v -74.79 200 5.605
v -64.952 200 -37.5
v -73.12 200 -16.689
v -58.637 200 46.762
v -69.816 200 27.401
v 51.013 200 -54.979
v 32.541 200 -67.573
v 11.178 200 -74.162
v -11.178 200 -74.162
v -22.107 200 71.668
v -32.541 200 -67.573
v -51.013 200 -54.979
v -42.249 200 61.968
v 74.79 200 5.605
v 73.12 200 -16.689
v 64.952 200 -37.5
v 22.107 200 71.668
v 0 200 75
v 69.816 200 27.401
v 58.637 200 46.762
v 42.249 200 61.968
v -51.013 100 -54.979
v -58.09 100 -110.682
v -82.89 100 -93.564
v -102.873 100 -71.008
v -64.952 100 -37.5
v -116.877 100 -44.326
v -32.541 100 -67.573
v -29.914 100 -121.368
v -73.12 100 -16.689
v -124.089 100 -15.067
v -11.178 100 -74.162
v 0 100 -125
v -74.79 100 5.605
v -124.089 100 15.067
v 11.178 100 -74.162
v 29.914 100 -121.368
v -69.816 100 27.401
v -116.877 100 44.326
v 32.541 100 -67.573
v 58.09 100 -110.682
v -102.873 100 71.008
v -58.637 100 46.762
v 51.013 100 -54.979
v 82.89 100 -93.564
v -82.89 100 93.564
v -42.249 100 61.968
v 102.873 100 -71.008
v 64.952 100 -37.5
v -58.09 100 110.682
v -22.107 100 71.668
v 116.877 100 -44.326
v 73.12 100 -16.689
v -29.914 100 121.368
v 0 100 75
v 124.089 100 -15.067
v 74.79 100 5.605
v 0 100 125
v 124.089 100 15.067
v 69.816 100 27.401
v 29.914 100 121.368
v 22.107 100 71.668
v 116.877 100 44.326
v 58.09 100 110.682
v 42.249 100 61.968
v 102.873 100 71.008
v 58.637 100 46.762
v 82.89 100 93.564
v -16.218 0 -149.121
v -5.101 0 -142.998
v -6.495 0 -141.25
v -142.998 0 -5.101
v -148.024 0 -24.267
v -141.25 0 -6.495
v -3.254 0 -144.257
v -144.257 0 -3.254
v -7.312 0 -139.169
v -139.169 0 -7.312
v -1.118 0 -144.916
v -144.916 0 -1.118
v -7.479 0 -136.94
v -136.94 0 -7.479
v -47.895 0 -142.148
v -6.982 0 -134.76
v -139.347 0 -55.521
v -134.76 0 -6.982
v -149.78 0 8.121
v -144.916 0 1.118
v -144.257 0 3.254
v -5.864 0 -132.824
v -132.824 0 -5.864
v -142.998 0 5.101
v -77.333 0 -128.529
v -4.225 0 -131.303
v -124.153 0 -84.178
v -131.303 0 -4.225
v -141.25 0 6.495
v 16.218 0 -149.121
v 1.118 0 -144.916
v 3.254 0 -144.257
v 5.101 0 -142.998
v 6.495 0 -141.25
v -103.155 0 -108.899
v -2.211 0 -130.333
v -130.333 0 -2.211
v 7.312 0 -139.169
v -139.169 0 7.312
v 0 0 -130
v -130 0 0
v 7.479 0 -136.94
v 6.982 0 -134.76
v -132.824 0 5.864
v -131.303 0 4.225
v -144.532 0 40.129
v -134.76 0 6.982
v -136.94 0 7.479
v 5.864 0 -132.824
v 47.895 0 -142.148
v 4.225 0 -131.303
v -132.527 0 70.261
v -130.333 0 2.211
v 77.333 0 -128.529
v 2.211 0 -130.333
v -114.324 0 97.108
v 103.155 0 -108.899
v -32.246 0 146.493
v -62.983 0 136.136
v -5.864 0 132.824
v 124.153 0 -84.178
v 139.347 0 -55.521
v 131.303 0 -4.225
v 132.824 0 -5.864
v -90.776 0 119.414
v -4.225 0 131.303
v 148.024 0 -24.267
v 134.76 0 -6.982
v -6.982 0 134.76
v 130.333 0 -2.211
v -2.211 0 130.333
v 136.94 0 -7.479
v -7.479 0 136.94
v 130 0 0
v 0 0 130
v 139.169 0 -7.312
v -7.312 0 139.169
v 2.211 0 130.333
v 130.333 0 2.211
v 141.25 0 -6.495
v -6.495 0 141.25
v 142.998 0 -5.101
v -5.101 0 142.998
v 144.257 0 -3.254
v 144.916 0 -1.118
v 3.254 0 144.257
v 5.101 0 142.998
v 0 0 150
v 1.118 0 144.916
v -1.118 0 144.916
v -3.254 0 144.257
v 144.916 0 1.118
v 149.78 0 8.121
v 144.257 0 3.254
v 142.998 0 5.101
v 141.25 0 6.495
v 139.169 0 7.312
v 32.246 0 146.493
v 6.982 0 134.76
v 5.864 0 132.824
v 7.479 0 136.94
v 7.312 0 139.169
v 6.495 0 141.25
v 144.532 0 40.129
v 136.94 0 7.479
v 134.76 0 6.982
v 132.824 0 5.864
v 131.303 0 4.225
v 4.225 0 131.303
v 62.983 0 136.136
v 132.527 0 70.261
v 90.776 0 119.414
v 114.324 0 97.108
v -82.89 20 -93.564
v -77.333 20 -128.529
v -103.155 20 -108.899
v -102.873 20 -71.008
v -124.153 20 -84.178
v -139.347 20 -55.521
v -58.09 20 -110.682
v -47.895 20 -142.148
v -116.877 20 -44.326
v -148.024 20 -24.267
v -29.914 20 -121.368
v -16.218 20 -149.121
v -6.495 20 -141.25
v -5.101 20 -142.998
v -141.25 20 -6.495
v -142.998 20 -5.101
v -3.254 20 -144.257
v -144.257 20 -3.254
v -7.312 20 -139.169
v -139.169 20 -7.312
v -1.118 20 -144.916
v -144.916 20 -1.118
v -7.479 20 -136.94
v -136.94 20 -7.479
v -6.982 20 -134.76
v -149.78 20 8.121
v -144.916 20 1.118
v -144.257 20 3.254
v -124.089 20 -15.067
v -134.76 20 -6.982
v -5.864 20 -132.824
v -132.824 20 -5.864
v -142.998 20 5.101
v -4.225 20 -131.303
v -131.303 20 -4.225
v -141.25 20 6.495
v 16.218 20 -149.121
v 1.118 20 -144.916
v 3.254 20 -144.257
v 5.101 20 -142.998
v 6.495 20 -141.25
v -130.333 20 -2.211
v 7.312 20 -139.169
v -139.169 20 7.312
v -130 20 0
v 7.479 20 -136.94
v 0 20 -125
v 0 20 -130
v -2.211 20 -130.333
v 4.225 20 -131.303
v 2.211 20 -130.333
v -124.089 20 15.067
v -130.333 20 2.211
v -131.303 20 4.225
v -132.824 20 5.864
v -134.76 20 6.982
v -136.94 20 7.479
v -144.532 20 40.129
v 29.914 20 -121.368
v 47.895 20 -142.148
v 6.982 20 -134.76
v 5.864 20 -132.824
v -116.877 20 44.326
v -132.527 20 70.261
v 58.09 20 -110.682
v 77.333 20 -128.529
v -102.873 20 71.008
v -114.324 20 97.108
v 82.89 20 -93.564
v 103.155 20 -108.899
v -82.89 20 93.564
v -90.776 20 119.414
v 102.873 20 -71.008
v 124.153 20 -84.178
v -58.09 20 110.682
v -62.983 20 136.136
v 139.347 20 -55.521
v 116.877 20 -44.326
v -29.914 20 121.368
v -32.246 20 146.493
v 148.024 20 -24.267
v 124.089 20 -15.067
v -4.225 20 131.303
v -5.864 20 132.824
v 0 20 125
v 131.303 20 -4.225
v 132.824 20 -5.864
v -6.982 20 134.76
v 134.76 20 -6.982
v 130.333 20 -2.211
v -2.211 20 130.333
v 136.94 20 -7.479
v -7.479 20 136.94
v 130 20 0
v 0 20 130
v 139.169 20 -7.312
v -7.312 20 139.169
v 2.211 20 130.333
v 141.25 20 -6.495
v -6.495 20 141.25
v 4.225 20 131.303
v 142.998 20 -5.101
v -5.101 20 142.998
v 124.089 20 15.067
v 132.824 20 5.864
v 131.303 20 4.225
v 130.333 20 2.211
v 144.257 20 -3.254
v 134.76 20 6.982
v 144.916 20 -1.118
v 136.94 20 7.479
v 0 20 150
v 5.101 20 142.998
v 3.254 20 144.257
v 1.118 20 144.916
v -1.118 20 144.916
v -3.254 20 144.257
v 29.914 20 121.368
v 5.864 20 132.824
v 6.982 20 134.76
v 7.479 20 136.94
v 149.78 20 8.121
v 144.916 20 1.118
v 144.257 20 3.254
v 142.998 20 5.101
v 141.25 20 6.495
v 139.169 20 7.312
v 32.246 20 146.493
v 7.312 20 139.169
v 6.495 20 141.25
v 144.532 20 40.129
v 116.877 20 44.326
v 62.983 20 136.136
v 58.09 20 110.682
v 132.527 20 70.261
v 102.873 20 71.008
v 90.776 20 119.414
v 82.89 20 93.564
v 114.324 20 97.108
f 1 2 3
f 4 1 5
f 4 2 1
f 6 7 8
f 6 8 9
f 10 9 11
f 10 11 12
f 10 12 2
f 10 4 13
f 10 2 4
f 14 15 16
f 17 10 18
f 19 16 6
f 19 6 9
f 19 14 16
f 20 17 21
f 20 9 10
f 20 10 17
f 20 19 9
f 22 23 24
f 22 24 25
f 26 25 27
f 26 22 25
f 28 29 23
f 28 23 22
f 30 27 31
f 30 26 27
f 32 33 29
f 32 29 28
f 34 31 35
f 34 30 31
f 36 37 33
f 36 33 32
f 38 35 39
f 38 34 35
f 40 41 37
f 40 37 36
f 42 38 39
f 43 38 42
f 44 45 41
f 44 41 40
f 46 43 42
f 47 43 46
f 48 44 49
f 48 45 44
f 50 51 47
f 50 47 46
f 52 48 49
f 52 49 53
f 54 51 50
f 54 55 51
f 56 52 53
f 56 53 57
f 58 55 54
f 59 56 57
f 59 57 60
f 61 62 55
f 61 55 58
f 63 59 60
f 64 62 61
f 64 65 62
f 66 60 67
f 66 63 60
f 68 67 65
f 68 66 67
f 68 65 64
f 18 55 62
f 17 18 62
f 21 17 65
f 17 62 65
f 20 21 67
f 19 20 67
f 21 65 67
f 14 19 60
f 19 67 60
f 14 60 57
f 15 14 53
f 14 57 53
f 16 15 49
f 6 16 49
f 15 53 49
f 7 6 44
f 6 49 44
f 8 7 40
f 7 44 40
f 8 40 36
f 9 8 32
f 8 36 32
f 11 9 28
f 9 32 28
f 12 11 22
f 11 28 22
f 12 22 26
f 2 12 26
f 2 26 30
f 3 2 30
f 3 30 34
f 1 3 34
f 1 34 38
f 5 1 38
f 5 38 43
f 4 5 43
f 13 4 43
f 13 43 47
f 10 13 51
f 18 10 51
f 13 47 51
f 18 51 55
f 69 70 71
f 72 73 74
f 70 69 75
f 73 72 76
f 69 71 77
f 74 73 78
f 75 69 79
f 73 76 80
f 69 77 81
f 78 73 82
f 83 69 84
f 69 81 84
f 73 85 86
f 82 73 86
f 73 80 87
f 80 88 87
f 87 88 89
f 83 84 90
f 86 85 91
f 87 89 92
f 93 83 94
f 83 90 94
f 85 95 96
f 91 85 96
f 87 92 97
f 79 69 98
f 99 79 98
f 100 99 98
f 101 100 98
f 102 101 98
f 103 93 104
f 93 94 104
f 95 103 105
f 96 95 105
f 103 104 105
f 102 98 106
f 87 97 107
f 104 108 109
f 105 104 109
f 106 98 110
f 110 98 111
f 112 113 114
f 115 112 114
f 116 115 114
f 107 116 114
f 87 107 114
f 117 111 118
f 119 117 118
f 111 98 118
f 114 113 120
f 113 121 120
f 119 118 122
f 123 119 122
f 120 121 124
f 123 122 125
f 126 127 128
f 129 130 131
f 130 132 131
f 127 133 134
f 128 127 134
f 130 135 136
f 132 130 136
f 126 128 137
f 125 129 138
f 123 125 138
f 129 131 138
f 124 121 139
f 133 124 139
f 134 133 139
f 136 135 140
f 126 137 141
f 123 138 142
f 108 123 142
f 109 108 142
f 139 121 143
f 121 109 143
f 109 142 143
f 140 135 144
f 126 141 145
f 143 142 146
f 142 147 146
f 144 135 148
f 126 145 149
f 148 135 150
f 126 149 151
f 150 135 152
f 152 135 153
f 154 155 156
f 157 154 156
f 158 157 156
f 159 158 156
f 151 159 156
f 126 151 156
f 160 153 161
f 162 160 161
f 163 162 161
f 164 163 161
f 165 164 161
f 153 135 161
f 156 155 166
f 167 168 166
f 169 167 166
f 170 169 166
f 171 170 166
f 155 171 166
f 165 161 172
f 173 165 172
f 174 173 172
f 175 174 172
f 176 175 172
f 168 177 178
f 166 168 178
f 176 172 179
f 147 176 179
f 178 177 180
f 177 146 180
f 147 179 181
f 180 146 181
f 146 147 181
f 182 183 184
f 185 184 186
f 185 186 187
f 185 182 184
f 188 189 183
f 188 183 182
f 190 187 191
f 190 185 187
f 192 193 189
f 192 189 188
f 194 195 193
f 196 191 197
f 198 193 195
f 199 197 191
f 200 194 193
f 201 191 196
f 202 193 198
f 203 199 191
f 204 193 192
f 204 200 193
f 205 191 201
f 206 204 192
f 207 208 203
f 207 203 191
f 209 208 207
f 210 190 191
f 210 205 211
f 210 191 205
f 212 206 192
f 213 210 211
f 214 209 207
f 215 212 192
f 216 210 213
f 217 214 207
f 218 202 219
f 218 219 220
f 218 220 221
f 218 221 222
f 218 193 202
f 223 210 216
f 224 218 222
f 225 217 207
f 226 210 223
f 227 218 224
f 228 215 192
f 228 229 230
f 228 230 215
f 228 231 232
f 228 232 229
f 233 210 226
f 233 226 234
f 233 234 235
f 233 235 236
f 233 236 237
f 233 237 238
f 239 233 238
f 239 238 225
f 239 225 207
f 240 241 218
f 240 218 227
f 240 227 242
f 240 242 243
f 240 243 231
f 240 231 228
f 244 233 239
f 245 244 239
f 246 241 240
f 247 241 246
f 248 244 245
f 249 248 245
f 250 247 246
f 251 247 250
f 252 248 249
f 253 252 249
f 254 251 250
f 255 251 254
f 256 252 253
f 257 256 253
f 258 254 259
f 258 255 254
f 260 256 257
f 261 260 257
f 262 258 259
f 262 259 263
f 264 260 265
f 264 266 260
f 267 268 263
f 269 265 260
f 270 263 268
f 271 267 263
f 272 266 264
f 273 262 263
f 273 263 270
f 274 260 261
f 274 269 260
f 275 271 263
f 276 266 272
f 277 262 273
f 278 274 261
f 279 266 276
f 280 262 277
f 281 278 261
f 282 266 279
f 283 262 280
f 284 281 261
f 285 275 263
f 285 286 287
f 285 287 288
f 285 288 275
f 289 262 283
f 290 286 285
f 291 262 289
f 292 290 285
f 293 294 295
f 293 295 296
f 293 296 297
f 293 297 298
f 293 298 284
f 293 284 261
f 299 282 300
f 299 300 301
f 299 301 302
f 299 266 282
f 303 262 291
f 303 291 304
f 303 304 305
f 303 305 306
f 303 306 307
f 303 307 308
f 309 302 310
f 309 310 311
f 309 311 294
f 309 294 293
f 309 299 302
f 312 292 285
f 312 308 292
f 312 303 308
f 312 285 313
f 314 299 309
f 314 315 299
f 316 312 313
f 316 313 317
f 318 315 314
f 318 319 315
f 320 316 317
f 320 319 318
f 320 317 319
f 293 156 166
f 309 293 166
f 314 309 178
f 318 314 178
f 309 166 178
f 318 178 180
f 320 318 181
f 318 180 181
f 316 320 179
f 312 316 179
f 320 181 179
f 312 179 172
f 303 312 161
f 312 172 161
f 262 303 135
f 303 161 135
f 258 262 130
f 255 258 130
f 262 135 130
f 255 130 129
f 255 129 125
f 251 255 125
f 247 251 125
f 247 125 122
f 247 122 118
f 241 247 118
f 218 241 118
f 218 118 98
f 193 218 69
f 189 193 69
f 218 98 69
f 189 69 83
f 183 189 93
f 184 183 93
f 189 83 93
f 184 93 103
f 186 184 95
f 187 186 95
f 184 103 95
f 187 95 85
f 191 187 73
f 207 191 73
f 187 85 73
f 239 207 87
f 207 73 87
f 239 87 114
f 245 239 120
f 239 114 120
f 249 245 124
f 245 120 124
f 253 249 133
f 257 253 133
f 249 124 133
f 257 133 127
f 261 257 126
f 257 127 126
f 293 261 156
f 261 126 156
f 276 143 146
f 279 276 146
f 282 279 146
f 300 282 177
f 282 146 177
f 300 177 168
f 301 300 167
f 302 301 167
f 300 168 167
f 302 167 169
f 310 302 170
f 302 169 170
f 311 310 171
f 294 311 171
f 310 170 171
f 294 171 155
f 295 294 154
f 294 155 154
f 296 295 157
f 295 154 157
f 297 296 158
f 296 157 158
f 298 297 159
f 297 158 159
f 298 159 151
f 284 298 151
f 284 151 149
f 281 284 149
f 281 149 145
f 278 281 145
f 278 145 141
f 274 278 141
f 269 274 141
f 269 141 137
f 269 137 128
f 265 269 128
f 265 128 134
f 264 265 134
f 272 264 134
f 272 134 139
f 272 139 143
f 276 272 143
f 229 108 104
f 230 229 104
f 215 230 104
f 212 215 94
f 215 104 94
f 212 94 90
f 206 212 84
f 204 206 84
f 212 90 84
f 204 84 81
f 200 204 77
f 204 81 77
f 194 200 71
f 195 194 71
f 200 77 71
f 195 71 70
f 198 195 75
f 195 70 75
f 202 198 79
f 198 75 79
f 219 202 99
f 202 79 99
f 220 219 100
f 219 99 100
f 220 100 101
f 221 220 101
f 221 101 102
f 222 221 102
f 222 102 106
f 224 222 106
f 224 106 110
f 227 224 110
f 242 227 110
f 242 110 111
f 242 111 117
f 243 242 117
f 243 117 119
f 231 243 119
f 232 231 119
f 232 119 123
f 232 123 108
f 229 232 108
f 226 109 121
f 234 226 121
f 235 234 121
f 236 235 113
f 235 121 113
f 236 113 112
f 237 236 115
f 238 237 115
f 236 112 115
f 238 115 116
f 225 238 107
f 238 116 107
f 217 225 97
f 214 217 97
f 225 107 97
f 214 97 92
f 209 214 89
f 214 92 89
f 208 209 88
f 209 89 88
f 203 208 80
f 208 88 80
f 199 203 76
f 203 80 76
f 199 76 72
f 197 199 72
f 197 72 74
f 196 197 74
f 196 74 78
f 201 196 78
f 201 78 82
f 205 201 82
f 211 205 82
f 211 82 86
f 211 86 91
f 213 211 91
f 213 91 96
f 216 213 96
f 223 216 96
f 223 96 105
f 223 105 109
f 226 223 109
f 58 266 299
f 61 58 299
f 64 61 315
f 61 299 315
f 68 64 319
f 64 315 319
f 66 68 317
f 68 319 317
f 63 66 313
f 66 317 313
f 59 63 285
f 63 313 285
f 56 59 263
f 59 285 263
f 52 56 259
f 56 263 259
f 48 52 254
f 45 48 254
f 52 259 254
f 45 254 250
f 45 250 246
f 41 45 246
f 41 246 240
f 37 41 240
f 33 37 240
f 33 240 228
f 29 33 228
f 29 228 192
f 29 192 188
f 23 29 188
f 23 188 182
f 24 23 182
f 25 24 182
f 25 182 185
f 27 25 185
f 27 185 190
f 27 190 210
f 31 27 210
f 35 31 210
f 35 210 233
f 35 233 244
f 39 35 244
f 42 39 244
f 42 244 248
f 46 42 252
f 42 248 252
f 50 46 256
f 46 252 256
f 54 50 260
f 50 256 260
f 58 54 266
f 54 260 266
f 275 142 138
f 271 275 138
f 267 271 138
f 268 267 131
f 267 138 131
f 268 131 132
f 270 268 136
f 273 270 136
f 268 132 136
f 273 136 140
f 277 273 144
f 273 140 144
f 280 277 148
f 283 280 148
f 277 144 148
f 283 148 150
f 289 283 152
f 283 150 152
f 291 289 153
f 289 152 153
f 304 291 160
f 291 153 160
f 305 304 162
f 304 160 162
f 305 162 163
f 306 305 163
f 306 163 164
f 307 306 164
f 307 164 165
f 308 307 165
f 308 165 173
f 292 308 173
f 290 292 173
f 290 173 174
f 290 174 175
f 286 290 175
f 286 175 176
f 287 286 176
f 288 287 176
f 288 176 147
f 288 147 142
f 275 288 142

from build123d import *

# Parameters (mm, degrees)
SKETCH1_R                  = 150
SKETCH1_R_2                = 125
BOSS_EXTRUDE1_DEPTH        = 20
SKETCH1_2_R                = 125
BOSS_EXTRUDE2_DEPTH        = 100
SKETCH2_R                  = 75
BOSS_EXTRUDE3_DEPTH        = 100
F_15_0_15_DIAMETER_HOLE1_D = 15
CIRPATTERN1_COUNT          = 4


with BuildPart() as part:
    # Sketch1 → Boss-Extrude1 (new body)
    with BuildSketch(Plane(origin=(0, 0, 0), x_dir=(1, 0, 0), z_dir=(0, 1, 0))):
        Circle(SKETCH1_R)
        Circle(SKETCH1_R_2, mode=Mode.SUBTRACT)
    extrude(amount=BOSS_EXTRUDE1_DEPTH)

    # Sketch1<2> → Boss-Extrude2 (add)
    with BuildSketch(Plane(origin=(0, 0, 0), x_dir=(1, 0, 0), z_dir=(0, 1, 0))):
        Circle(SKETCH1_2_R)
    extrude(amount=BOSS_EXTRUDE2_DEPTH)

    # Sketch2 → Boss-Extrude3 (add)
    with BuildSketch(Plane(origin=(0, 100, 0), x_dir=(1, 0, 0), z_dir=(0, 1, 0))):
        Circle(SKETCH2_R)
    extrude(amount=BOSS_EXTRUDE3_DEPTH)

    # Ø15.0 (15) Diameter Hole1 (through all)
    with Locations(Plane(origin=(0, 20, 0), x_dir=(1, 0, 0), z_dir=(0, 1, 0))):
        with Locations((137.5, 0)):
            f_15_0_15_diameter_hole1 = Hole(F_15_0_15_DIAMETER_HOLE1_D / 2)

    # CirPattern1: Ø15.0 (15) Diameter Hole1 ×4 about axis
    cirpattern1_axis = Axis((0, 100, 0), (0, -1, 0))
    for i in range(1, CIRPATTERN1_COUNT):
        add(f_15_0_15_diameter_hole1.rotate(cirpattern1_axis, i * 360 / CIRPATTERN1_COUNT), mode=Mode.SUBTRACT)


solid = part.part
